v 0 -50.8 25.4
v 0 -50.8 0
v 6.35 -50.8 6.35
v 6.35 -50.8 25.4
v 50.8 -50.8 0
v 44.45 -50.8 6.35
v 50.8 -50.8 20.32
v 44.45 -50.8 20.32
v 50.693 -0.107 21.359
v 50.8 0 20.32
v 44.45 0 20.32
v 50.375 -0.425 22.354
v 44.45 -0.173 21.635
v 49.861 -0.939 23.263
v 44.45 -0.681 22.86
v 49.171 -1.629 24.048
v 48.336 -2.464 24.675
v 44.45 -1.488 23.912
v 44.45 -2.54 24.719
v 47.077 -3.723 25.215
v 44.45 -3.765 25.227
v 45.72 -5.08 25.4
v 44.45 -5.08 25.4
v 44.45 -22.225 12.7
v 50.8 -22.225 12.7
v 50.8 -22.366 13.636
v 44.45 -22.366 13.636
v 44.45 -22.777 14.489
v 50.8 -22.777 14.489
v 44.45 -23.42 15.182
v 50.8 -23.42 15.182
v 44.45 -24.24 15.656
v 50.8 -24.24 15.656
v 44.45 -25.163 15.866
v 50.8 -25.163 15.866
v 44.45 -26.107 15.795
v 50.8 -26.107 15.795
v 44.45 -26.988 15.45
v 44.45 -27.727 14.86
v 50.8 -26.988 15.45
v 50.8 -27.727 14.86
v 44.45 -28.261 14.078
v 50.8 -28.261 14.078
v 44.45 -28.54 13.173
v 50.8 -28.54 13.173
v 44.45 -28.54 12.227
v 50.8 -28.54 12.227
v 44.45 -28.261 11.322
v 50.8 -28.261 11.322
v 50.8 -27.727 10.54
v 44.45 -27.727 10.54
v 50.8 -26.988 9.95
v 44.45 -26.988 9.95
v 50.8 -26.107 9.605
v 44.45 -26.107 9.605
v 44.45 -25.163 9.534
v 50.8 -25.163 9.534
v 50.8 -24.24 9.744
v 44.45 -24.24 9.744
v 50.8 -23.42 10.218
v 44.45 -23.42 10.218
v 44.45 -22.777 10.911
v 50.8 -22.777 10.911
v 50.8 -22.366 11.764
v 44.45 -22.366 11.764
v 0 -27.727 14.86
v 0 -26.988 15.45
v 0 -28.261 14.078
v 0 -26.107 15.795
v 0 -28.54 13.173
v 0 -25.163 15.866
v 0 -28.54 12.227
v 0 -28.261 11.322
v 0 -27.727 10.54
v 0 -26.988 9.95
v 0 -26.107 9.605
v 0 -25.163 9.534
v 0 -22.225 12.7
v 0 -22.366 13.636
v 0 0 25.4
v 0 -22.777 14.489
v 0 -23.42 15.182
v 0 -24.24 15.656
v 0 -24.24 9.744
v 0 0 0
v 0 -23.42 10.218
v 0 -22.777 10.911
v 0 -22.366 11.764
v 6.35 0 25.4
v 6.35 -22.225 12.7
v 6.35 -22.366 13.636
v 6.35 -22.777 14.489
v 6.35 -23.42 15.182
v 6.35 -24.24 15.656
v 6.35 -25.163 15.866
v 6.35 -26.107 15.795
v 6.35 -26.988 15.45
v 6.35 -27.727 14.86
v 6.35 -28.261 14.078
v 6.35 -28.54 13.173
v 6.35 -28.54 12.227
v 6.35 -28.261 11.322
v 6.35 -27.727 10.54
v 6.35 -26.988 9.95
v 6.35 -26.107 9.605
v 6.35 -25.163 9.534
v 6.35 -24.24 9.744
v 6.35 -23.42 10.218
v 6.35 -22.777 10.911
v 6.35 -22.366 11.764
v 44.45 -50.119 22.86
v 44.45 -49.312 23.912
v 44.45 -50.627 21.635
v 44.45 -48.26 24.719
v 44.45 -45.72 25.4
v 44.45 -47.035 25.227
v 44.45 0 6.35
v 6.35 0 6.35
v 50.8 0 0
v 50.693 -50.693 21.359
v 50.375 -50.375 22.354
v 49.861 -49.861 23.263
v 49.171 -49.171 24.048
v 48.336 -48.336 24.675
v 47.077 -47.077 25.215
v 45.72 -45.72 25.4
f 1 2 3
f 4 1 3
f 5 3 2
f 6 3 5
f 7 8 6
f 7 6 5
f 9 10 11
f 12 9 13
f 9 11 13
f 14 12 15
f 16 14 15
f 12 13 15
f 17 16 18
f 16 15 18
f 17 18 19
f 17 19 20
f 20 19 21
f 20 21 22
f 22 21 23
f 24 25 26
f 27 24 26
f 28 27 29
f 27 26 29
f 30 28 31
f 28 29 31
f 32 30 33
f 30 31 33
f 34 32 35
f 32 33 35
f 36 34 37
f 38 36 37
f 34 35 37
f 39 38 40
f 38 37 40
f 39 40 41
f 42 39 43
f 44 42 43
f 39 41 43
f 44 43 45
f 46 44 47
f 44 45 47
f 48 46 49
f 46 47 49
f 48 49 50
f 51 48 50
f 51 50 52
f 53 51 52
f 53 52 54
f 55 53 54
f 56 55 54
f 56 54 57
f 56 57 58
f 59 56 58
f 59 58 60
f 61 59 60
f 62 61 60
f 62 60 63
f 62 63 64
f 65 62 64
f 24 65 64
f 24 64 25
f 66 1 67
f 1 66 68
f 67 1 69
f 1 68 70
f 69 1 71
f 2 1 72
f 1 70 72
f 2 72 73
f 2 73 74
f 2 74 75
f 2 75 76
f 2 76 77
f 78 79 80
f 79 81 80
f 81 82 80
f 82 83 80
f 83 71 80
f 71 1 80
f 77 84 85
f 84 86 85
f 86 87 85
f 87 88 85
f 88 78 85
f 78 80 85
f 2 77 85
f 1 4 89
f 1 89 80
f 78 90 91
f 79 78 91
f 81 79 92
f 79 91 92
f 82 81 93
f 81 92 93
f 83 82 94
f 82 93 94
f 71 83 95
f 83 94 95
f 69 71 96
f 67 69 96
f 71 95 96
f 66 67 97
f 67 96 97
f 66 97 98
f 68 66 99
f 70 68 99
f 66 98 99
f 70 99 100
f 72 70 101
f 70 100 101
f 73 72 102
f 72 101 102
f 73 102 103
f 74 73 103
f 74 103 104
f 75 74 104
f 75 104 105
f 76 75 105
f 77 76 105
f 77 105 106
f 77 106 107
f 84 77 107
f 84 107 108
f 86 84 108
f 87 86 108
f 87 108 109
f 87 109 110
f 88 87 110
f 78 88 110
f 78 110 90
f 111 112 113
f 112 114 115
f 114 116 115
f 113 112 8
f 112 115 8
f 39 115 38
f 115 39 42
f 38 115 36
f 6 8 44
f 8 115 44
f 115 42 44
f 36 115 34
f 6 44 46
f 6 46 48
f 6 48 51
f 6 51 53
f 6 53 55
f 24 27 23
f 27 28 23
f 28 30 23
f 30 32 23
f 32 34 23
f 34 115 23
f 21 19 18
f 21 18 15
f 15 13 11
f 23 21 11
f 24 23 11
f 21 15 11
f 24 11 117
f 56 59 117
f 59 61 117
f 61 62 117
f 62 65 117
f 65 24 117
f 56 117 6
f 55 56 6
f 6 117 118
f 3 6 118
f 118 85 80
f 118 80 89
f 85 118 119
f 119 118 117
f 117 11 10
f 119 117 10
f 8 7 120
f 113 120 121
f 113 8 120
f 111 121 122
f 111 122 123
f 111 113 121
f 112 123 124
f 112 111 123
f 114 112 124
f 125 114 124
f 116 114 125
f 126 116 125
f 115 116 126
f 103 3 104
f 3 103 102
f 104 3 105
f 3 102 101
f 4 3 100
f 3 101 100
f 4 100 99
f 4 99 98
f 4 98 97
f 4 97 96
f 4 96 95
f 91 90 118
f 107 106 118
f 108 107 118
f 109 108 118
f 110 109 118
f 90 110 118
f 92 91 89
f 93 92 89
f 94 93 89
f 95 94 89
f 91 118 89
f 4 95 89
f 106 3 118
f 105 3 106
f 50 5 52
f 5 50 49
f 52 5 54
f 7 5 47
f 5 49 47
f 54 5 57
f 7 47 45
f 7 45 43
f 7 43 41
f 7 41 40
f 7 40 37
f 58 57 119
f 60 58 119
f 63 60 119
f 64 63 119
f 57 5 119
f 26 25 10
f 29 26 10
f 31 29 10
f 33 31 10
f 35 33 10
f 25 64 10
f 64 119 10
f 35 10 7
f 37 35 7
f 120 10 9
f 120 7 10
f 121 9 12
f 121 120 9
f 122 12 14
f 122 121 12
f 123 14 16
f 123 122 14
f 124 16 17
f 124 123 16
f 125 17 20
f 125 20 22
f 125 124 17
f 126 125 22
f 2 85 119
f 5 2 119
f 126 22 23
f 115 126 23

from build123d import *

# Parameters (mm, degrees)
F1_DEPTH = 50.8
F3_D     = 6.35
F4_R     = 5.08


with BuildPart() as f1:
    # F0 (on Front) → F1 (new body)
    with BuildSketch(Plane.XZ):
        Polygon((6.35, 6.35), (6.35, 25.4), (0, 25.4), (0, 0), (50.8, 0), (50.8, 25.4), (44.45, 25.4), (44.45, 6.35), align=None)
    extrude(amount=F1_DEPTH)

    # F3 (through all)
    with Locations(Plane(origin=(0, 0, 0), x_dir=(0, -1, 0), z_dir=(-1, 0, 0))):
        with Locations((25.4, 12.7)):
            Hole(F3_D / 2)

    # F4
    f4_edges = [f1.edges().sort_by_distance(p)[0] for p in [
        (50.8, -25.4, 25.4),
        (47.625, -50.8, 25.4),
        (47.625, 0, 25.4),
    ]]
    fillet(f4_edges, radius=F4_R)


solid = f1.part
